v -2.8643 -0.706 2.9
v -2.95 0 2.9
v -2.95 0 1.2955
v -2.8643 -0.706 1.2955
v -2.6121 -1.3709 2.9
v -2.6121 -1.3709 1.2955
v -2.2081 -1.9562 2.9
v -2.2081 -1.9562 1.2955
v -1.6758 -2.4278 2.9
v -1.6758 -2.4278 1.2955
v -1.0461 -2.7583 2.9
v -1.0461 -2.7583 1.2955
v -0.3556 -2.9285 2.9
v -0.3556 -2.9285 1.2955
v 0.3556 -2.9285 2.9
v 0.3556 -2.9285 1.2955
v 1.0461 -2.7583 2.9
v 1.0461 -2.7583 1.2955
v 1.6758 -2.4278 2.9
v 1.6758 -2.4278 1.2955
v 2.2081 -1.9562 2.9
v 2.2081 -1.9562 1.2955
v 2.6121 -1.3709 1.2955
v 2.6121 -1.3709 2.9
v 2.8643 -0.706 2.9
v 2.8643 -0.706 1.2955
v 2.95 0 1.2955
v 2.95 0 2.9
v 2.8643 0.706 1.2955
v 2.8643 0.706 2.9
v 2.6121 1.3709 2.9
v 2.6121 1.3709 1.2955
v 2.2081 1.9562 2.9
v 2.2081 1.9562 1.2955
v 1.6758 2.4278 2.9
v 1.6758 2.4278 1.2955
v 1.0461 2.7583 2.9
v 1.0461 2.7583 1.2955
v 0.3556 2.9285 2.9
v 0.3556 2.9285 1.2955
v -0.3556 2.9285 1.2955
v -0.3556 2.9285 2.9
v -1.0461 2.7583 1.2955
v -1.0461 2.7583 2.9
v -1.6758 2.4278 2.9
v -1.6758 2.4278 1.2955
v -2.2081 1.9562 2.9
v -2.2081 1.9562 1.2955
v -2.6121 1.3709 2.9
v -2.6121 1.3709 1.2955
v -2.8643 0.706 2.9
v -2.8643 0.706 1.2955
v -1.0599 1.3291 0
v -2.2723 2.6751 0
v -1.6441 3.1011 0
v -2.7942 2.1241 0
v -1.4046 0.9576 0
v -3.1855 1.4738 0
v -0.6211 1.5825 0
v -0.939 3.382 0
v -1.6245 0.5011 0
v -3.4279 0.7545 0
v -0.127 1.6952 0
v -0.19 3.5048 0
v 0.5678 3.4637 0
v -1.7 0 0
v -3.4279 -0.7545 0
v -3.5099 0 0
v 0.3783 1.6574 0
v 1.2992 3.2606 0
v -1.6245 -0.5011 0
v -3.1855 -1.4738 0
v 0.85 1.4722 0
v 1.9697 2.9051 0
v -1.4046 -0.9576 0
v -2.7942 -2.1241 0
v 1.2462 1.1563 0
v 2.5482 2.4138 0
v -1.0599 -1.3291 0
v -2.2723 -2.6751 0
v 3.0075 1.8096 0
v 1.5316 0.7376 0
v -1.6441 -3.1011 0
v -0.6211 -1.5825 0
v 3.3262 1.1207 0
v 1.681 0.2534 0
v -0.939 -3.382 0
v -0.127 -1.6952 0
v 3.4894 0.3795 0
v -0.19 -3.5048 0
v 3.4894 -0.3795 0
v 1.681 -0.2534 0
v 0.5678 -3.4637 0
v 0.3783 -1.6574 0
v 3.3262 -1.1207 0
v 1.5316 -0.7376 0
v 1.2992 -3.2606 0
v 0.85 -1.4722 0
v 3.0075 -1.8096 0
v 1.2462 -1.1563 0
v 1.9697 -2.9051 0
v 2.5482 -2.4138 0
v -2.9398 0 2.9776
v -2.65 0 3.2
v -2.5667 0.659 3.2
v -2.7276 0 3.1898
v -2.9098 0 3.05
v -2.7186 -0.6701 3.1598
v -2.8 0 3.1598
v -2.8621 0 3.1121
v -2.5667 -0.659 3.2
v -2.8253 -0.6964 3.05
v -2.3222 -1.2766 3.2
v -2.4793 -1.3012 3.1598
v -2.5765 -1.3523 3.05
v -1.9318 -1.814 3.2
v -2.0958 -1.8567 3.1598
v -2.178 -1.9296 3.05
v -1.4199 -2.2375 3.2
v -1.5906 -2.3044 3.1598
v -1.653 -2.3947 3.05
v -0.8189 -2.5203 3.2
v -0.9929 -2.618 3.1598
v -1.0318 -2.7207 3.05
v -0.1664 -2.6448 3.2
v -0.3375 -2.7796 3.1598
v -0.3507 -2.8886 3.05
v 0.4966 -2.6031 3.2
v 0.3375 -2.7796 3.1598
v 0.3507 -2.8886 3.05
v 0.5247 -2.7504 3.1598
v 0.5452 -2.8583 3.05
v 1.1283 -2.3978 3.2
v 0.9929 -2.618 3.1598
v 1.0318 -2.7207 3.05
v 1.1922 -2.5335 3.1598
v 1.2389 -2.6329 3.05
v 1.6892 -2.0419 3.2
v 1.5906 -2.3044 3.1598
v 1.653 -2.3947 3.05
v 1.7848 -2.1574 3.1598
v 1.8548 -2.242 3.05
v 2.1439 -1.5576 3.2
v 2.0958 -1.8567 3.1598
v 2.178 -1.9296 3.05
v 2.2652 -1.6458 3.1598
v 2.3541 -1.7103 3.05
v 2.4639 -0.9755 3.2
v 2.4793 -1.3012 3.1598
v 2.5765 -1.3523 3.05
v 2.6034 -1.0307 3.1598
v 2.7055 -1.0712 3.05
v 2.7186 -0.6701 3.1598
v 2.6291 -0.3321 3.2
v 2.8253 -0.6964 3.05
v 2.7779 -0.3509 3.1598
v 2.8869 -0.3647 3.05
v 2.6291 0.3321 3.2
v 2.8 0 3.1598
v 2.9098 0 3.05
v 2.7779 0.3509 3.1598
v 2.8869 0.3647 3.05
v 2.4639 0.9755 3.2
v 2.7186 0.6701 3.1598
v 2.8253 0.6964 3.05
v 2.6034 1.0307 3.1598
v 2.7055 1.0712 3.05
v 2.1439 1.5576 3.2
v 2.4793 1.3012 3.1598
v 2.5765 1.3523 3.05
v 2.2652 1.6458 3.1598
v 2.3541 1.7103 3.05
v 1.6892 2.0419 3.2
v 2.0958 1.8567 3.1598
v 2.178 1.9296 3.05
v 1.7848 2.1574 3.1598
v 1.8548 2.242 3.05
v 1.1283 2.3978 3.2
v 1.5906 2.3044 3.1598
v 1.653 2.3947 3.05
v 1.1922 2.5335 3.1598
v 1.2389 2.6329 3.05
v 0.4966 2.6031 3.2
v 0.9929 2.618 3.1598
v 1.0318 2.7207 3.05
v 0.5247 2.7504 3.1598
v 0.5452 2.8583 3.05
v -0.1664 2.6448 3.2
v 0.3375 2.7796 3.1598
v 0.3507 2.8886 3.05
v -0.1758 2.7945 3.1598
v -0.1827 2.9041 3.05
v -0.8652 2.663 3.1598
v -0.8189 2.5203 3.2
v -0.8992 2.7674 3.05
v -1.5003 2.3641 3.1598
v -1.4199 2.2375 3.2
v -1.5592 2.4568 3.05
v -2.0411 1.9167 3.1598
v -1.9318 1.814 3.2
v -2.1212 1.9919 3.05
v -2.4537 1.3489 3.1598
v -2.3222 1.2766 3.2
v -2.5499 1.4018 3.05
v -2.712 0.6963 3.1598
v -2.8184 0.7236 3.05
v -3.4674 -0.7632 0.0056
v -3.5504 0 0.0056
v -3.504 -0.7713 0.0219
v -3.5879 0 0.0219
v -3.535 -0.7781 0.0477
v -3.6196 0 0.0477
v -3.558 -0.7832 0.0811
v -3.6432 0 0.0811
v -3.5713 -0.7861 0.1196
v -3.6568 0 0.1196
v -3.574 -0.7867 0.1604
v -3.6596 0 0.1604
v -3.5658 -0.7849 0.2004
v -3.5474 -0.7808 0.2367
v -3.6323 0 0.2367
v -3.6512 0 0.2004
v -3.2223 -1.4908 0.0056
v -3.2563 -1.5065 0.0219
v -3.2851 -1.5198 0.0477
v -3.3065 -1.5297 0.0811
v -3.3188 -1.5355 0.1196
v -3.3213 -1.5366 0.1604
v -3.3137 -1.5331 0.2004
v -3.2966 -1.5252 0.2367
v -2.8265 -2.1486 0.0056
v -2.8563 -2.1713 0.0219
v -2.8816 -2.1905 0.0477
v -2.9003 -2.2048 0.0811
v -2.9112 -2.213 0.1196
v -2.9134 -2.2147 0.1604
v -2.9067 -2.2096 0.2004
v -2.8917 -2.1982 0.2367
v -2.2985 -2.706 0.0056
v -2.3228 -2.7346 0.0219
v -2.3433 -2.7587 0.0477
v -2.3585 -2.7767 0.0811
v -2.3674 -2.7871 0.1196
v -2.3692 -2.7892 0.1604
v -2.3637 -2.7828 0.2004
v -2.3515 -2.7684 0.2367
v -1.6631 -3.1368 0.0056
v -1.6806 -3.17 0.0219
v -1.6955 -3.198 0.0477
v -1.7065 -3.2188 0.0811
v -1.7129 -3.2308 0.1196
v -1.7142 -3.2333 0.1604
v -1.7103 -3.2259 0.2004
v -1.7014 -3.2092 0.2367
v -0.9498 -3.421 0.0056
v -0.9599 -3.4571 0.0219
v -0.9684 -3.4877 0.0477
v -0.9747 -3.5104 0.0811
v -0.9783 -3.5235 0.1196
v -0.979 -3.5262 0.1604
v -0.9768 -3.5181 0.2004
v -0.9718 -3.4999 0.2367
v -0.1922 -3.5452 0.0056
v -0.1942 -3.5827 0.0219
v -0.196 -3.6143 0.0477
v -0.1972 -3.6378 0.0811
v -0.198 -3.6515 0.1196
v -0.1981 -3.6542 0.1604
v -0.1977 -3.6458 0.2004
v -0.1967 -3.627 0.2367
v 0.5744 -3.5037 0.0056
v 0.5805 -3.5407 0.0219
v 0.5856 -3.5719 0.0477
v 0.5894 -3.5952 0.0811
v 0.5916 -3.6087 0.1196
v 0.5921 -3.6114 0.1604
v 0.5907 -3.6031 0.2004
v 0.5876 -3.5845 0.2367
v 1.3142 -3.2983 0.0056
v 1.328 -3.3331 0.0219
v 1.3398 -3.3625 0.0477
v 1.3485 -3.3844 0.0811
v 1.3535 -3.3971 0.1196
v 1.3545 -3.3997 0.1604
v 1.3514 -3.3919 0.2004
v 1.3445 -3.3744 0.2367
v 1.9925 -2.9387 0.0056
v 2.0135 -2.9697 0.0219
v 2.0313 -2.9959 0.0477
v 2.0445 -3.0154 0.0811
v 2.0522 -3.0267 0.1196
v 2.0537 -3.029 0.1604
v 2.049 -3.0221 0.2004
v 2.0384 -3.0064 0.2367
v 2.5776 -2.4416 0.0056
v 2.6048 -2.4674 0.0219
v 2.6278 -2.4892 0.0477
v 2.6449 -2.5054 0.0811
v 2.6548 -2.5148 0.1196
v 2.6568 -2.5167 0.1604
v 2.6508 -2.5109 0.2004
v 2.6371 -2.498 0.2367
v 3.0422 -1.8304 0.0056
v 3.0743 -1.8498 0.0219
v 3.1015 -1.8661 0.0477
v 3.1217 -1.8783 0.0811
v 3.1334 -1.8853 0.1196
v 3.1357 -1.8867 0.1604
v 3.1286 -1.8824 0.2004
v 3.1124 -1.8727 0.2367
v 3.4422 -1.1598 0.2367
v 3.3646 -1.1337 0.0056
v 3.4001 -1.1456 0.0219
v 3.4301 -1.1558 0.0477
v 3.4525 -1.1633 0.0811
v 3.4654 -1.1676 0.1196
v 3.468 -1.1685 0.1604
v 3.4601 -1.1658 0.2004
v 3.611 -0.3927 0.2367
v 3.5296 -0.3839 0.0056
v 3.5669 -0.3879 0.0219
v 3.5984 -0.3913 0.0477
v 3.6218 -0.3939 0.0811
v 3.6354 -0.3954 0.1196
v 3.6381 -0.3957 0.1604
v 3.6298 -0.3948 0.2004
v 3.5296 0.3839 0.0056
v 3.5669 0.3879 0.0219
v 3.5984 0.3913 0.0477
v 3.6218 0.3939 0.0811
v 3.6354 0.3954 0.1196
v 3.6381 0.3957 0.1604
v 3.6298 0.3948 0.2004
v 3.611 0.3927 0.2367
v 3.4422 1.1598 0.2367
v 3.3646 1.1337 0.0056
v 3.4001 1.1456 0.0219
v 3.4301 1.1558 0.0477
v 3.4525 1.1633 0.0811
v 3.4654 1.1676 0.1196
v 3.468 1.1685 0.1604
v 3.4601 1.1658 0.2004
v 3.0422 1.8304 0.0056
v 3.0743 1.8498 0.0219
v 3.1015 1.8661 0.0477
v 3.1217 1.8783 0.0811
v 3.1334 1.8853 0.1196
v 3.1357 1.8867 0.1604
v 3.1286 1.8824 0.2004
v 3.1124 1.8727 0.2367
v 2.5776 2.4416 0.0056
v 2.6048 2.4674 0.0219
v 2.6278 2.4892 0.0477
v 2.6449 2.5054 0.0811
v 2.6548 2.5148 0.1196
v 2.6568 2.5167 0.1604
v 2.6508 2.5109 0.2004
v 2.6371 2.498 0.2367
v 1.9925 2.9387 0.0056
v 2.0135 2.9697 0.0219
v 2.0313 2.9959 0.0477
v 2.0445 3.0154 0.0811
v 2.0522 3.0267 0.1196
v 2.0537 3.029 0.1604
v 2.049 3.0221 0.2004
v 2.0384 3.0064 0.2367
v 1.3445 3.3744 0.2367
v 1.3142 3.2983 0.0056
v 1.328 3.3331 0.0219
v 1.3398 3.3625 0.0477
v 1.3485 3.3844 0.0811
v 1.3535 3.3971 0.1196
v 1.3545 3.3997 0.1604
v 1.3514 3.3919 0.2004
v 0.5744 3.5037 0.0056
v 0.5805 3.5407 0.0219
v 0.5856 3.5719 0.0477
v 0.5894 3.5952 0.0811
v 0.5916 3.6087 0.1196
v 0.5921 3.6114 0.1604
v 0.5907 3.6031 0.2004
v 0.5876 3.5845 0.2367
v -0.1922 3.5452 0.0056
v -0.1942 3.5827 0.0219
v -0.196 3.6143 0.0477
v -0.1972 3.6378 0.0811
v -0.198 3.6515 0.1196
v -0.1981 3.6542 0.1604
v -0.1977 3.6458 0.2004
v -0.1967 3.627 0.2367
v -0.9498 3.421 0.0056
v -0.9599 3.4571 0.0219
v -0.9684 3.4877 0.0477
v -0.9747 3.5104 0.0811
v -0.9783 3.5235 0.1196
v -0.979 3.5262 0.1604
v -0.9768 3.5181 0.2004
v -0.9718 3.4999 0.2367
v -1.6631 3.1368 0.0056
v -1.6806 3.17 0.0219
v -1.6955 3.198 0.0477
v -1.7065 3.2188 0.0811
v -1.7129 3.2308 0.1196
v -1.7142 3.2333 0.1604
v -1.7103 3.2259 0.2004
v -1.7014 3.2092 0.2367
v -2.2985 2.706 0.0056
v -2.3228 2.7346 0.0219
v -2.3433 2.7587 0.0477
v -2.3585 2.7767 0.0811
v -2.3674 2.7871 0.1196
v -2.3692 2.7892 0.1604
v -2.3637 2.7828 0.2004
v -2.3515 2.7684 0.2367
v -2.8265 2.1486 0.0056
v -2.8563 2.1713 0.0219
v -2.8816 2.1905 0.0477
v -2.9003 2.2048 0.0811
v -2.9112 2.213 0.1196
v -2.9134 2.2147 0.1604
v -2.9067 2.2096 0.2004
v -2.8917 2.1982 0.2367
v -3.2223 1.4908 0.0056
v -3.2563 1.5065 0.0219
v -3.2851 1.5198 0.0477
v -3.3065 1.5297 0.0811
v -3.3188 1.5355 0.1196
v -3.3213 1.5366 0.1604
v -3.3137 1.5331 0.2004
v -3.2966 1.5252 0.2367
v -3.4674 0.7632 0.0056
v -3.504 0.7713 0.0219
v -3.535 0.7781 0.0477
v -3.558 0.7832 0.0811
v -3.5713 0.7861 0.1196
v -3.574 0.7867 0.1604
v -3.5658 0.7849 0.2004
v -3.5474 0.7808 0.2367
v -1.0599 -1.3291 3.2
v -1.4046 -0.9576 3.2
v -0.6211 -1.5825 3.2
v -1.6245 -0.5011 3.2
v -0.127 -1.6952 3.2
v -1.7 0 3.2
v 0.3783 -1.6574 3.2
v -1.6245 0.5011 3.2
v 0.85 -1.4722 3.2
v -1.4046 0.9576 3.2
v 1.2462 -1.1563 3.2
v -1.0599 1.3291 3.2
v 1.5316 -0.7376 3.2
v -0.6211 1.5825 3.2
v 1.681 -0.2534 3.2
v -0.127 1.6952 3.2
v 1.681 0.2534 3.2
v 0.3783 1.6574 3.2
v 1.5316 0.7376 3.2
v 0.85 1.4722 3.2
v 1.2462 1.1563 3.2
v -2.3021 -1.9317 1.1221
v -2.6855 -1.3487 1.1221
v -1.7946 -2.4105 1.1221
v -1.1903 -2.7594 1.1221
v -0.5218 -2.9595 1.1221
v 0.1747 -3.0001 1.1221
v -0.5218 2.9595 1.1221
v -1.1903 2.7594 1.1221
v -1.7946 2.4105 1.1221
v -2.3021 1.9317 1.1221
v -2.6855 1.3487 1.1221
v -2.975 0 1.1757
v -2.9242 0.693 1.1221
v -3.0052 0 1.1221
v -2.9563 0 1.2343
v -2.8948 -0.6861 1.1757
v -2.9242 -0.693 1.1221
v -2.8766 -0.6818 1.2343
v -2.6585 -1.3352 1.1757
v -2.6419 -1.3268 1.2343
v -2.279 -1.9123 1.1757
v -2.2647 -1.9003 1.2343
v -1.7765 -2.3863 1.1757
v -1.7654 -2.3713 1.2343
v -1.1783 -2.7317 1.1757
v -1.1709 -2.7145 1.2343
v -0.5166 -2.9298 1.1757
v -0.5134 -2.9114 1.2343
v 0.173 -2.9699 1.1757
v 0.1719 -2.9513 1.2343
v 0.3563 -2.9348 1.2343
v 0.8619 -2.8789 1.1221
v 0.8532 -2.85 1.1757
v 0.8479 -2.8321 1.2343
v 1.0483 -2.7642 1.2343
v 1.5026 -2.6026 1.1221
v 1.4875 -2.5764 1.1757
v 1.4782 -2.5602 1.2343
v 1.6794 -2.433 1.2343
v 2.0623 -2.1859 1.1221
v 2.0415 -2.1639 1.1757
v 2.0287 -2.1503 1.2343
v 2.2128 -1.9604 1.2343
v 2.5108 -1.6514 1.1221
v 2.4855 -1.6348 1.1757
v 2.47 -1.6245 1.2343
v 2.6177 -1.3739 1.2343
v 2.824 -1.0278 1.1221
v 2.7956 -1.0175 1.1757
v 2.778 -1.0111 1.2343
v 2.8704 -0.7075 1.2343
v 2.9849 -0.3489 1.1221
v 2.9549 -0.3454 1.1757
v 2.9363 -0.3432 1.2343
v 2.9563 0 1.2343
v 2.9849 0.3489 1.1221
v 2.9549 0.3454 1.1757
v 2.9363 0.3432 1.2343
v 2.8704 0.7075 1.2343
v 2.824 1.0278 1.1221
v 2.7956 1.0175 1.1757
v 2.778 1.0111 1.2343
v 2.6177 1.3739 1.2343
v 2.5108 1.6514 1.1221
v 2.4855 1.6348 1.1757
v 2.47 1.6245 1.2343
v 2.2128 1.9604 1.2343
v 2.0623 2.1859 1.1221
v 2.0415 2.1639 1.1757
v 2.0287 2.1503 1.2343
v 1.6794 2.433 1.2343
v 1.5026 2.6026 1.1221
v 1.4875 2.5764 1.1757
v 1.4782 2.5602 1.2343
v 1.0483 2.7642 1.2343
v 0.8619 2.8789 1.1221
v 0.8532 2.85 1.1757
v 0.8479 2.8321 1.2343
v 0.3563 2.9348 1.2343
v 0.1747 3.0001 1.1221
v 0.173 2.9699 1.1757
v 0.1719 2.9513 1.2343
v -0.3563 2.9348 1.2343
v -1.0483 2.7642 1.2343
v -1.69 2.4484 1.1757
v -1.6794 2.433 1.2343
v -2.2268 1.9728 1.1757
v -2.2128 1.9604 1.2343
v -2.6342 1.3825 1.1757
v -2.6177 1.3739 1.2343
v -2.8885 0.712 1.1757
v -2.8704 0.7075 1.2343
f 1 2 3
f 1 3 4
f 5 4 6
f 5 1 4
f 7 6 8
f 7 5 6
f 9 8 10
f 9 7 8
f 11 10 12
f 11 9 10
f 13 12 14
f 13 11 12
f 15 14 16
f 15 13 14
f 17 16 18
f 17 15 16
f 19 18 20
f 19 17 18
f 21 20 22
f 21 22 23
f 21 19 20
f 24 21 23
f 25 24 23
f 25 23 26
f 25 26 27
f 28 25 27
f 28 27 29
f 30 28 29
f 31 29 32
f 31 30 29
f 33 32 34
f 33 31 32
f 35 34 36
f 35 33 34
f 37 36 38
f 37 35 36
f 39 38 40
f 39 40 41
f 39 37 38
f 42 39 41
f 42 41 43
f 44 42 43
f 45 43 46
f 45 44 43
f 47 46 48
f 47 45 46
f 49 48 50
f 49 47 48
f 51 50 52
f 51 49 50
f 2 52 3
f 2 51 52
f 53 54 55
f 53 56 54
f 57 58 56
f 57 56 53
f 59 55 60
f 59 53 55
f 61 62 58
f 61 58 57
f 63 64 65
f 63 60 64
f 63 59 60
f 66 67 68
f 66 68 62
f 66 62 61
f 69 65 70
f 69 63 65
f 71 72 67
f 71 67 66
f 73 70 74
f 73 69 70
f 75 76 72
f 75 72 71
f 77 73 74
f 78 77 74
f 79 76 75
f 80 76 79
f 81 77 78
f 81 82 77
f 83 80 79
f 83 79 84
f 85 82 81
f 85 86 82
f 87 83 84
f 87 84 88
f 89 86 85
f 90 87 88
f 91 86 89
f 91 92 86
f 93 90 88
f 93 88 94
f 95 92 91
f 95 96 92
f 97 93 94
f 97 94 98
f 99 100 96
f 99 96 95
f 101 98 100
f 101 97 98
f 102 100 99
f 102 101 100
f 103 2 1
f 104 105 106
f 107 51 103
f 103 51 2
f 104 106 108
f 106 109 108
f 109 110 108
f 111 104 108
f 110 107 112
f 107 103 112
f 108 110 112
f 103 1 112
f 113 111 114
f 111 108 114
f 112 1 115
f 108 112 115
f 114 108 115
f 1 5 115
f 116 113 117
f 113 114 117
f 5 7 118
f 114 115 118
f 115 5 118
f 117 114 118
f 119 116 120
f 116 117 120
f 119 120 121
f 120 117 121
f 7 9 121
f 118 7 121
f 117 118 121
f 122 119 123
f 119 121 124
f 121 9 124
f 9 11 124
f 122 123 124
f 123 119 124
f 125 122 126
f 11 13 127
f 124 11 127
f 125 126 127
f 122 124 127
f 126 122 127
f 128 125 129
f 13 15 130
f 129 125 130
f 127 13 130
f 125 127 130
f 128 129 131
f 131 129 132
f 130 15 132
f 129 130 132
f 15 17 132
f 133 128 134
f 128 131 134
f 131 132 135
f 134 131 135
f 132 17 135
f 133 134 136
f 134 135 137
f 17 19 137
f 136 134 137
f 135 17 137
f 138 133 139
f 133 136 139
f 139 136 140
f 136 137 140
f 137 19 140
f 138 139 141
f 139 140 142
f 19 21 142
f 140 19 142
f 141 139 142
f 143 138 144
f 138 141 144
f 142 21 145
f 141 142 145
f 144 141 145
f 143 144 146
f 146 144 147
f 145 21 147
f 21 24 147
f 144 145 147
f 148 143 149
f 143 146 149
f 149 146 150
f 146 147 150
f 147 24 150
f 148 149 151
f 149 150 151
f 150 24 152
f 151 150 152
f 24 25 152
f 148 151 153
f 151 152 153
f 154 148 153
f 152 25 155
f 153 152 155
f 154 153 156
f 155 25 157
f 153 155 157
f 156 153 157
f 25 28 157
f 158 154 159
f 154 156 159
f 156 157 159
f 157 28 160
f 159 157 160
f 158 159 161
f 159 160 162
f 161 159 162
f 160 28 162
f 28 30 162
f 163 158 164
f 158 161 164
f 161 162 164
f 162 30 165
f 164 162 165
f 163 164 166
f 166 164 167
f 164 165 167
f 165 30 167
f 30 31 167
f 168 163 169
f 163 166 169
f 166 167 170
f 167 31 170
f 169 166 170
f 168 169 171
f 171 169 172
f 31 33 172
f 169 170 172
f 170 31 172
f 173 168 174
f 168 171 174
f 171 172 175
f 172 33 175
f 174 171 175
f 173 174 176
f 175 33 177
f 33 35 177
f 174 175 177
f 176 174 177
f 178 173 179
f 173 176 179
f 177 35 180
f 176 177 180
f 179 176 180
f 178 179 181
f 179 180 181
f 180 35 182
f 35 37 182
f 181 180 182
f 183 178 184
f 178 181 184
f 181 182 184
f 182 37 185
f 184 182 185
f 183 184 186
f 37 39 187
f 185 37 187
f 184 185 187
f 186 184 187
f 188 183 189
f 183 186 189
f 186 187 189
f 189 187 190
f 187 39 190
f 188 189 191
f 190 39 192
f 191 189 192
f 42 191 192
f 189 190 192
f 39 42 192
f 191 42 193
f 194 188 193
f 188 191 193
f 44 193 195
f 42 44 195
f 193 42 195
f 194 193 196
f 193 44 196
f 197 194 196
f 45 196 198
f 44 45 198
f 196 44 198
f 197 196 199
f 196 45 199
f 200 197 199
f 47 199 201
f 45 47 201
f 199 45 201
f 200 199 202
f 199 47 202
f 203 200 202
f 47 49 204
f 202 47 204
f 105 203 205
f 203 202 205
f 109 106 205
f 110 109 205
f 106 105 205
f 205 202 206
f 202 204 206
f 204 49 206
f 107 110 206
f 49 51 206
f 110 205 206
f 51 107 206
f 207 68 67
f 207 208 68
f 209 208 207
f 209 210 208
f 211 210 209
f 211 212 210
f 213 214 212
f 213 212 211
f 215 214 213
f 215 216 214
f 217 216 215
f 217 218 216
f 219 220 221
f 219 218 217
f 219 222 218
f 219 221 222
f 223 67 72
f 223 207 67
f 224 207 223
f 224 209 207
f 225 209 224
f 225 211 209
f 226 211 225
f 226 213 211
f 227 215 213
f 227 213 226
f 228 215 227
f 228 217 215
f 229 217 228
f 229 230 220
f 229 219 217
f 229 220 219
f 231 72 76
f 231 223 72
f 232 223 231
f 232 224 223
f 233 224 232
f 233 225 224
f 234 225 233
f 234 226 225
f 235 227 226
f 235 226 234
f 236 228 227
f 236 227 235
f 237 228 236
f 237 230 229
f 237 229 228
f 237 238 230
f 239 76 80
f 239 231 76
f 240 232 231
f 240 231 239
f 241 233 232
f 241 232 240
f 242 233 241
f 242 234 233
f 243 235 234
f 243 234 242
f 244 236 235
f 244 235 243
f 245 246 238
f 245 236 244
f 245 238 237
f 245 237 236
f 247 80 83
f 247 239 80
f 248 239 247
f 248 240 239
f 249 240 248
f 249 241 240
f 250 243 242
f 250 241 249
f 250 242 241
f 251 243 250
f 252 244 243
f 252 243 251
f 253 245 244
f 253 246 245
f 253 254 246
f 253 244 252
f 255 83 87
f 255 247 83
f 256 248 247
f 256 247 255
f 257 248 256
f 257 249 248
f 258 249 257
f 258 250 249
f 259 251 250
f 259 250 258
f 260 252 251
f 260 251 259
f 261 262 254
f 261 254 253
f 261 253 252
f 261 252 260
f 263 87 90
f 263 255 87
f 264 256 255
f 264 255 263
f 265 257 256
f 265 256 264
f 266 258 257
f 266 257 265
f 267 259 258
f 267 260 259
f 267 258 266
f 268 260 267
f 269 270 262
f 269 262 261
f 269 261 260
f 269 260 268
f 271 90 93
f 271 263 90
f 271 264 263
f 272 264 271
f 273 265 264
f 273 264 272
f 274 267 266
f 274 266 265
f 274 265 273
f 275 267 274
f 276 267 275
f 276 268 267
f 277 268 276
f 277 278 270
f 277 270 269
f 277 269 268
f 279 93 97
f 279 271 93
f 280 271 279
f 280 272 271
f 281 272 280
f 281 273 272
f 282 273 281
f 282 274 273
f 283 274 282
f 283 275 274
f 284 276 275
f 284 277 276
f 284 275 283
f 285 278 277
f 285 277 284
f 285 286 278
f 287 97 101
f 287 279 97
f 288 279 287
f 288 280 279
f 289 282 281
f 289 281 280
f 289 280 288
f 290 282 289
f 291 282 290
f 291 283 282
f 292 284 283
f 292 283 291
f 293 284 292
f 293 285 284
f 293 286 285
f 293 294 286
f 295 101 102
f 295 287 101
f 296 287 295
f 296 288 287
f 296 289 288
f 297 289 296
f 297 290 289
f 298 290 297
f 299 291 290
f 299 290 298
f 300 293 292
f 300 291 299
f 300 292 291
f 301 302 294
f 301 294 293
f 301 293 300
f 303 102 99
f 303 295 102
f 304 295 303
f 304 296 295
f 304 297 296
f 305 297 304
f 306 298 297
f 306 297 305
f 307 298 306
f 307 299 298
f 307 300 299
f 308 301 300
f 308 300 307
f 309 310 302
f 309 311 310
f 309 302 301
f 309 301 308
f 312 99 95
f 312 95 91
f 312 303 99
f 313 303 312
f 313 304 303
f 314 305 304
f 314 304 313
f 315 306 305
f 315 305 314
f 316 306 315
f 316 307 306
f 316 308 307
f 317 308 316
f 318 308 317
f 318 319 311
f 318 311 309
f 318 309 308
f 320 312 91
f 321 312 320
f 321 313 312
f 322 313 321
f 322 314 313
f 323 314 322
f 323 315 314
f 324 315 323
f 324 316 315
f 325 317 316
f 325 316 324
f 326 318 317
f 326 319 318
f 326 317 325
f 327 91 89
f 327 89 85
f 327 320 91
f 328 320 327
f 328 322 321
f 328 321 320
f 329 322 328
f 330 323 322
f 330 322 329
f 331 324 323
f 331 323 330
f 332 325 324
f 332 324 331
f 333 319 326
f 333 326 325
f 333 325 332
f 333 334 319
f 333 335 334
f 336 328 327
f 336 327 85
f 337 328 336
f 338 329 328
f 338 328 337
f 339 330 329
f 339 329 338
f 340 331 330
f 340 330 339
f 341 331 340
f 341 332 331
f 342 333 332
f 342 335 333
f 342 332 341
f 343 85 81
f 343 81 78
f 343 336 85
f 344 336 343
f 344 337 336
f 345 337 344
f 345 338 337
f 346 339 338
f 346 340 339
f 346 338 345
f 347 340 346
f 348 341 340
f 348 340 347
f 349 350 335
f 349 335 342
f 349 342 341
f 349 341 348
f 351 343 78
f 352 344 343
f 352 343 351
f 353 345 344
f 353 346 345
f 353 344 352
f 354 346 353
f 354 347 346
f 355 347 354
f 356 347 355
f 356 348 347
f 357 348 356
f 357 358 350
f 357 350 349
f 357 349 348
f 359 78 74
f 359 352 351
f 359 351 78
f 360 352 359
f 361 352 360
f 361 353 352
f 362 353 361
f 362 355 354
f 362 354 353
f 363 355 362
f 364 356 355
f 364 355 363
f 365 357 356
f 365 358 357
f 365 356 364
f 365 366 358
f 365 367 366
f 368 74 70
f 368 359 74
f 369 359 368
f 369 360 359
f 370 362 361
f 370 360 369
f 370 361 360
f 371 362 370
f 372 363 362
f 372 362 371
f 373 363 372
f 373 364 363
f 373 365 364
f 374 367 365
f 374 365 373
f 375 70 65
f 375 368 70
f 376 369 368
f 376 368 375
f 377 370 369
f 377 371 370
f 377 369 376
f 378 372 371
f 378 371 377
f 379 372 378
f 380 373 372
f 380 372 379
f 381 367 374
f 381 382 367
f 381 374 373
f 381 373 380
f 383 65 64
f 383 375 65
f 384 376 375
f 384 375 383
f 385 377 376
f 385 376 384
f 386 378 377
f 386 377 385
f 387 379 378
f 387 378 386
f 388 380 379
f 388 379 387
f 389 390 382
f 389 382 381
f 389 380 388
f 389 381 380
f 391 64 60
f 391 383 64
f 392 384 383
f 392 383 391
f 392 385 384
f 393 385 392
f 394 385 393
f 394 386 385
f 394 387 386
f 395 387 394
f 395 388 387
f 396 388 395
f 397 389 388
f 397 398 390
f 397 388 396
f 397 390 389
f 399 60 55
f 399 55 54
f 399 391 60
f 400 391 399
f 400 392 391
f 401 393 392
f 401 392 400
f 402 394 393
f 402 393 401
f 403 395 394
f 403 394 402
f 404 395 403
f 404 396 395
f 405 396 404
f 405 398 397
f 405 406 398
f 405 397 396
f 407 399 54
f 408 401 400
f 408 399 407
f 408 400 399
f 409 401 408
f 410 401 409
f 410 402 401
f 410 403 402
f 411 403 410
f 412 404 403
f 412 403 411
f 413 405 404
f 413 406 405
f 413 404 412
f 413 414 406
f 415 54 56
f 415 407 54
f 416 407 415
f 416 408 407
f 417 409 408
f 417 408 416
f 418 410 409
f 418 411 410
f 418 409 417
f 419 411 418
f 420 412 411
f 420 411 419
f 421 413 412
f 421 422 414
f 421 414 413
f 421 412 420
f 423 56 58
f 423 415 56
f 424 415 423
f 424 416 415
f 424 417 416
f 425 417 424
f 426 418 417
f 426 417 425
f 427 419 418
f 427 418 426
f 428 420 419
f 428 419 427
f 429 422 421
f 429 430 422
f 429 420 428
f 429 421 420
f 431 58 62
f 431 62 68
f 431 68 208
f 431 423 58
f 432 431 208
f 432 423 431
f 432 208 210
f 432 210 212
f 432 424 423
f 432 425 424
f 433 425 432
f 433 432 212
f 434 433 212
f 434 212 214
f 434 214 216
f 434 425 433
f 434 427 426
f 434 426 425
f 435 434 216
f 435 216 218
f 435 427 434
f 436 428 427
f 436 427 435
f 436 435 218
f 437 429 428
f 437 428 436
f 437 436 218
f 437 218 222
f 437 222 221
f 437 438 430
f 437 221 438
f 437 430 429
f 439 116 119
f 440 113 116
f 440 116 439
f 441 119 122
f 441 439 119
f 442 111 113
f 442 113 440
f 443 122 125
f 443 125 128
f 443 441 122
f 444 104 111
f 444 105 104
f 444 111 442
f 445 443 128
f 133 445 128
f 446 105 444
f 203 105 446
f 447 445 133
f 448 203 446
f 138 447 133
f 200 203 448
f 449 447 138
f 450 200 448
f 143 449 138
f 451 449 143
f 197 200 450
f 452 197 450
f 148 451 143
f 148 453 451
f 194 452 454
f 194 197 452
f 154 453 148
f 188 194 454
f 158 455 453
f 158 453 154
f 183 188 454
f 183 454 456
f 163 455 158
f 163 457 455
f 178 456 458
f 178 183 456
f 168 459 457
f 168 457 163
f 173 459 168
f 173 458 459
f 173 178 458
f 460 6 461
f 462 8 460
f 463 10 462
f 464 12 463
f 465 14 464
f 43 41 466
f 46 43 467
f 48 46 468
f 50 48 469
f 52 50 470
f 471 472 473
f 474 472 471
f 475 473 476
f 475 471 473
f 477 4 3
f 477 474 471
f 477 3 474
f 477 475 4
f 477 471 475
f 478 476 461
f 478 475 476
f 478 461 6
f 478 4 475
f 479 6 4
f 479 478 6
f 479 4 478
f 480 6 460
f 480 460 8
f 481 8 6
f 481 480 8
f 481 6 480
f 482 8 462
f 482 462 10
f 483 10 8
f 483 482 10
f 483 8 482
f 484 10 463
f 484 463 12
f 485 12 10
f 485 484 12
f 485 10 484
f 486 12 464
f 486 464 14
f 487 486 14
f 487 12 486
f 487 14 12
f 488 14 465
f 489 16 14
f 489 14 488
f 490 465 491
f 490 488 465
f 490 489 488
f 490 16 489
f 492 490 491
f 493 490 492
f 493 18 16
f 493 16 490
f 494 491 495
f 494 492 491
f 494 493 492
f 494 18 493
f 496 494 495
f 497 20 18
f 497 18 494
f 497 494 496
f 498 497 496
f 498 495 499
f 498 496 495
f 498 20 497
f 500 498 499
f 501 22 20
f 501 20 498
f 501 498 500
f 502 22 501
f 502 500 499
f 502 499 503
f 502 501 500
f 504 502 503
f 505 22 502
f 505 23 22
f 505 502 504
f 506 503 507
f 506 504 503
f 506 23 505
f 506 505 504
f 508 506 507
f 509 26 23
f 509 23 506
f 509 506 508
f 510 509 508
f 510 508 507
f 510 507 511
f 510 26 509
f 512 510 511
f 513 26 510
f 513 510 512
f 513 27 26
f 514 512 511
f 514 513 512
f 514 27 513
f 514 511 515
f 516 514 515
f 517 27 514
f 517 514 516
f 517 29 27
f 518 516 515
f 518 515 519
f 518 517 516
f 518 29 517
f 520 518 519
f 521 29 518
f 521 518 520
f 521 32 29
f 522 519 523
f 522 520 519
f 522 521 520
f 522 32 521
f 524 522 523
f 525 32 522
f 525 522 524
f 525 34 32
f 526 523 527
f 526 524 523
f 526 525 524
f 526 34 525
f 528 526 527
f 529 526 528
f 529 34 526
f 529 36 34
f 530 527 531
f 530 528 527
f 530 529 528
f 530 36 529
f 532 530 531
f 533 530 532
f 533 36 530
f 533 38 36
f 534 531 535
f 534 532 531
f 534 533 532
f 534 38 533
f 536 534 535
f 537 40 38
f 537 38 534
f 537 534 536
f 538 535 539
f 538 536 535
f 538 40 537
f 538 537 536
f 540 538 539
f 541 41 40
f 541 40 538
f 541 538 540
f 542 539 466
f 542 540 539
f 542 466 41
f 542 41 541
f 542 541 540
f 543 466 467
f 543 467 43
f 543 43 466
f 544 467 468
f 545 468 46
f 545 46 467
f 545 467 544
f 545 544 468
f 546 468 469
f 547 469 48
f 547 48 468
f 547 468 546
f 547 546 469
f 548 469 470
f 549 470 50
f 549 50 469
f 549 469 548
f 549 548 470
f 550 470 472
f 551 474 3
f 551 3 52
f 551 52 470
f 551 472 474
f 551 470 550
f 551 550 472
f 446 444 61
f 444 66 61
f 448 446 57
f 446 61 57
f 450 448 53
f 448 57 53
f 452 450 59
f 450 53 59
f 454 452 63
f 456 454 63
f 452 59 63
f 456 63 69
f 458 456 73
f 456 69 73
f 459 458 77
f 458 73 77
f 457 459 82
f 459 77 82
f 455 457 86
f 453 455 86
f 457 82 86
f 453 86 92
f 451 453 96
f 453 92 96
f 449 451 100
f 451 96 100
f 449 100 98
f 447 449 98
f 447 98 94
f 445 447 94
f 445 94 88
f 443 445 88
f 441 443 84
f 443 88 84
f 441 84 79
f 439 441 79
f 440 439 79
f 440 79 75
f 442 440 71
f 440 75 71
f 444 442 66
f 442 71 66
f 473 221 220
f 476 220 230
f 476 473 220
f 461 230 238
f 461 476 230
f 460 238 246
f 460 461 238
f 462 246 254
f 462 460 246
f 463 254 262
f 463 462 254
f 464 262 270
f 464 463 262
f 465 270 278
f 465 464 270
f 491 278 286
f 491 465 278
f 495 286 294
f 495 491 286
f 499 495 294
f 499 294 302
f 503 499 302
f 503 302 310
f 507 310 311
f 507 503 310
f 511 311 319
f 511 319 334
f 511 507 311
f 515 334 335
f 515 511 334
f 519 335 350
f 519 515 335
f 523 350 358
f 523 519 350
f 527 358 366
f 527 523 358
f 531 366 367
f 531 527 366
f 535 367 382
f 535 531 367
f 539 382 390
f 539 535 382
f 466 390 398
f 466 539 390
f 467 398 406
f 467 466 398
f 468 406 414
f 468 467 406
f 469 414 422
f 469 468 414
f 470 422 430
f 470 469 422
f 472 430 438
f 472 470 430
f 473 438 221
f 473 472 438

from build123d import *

# Parameters (mm, degrees)
HOLE_WIZARD_M3_1_D           = 3.4
HOLE_WIZARD_M3_1_CBORE_D     = 9
HOLE_WIZARD_M3_1_CBORE_DEPTH = 0.5
FILLET_2_R                   = 0.3


with BuildPart() as part:
    # 草图1 → 旋转1 (revolve)
    with BuildSketch(Plane(origin=(0, 0, 0), x_dir=(0, 0, -1), z_dir=(1, 0, 0)), mode=Mode.PRIVATE) as revolve_1_sk:
        with BuildLine():
            Line((0, 0), (0, -3.509931985))
            ThreePointArc((0, -3.509931985), (-0.081099311, -3.643171225), (-0.236702601, -3.632335658))
            Line((-0.236702601, -3.632335658), (-1.122080957, -3.005192656))
            ThreePointArc((-1.122080957, -3.005192656), (-1.204497707, -2.964130971), (-1.295486159, -2.95))
            Line((-1.295486159, -2.95), (-3.4, -2.95))
            ThreePointArc((-3.4, -2.95), (-3.612132034, -2.862132034), (-3.7, -2.65))
            Line((-3.7, -2.65), (-3.7, 0))
            Line((-3.7, 0), (0, 0))
        make_face()
    revolve(revolve_1_sk.sketch.rotate(Axis((0, 0, 0), (0, 0, 1)), 270), axis=Axis((0, 0, 0), (0, 0, 1)))

    # M3 六角头螺栓的柱形沉头孔1 (through all)
    with Locations(Plane.XY.offset(3.7)):
        with Locations((0, 0)):
            CounterBoreHole(HOLE_WIZARD_M3_1_D / 2, HOLE_WIZARD_M3_1_CBORE_D / 2, HOLE_WIZARD_M3_1_CBORE_DEPTH)

    # 圆角2
    fillet_2_edges = [part.edges().sort_by_distance(p)[0] for p in [
        (2.95, 0, 3.2),
    ]]
    fillet(fillet_2_edges, radius=FILLET_2_R)


solid = part.part
